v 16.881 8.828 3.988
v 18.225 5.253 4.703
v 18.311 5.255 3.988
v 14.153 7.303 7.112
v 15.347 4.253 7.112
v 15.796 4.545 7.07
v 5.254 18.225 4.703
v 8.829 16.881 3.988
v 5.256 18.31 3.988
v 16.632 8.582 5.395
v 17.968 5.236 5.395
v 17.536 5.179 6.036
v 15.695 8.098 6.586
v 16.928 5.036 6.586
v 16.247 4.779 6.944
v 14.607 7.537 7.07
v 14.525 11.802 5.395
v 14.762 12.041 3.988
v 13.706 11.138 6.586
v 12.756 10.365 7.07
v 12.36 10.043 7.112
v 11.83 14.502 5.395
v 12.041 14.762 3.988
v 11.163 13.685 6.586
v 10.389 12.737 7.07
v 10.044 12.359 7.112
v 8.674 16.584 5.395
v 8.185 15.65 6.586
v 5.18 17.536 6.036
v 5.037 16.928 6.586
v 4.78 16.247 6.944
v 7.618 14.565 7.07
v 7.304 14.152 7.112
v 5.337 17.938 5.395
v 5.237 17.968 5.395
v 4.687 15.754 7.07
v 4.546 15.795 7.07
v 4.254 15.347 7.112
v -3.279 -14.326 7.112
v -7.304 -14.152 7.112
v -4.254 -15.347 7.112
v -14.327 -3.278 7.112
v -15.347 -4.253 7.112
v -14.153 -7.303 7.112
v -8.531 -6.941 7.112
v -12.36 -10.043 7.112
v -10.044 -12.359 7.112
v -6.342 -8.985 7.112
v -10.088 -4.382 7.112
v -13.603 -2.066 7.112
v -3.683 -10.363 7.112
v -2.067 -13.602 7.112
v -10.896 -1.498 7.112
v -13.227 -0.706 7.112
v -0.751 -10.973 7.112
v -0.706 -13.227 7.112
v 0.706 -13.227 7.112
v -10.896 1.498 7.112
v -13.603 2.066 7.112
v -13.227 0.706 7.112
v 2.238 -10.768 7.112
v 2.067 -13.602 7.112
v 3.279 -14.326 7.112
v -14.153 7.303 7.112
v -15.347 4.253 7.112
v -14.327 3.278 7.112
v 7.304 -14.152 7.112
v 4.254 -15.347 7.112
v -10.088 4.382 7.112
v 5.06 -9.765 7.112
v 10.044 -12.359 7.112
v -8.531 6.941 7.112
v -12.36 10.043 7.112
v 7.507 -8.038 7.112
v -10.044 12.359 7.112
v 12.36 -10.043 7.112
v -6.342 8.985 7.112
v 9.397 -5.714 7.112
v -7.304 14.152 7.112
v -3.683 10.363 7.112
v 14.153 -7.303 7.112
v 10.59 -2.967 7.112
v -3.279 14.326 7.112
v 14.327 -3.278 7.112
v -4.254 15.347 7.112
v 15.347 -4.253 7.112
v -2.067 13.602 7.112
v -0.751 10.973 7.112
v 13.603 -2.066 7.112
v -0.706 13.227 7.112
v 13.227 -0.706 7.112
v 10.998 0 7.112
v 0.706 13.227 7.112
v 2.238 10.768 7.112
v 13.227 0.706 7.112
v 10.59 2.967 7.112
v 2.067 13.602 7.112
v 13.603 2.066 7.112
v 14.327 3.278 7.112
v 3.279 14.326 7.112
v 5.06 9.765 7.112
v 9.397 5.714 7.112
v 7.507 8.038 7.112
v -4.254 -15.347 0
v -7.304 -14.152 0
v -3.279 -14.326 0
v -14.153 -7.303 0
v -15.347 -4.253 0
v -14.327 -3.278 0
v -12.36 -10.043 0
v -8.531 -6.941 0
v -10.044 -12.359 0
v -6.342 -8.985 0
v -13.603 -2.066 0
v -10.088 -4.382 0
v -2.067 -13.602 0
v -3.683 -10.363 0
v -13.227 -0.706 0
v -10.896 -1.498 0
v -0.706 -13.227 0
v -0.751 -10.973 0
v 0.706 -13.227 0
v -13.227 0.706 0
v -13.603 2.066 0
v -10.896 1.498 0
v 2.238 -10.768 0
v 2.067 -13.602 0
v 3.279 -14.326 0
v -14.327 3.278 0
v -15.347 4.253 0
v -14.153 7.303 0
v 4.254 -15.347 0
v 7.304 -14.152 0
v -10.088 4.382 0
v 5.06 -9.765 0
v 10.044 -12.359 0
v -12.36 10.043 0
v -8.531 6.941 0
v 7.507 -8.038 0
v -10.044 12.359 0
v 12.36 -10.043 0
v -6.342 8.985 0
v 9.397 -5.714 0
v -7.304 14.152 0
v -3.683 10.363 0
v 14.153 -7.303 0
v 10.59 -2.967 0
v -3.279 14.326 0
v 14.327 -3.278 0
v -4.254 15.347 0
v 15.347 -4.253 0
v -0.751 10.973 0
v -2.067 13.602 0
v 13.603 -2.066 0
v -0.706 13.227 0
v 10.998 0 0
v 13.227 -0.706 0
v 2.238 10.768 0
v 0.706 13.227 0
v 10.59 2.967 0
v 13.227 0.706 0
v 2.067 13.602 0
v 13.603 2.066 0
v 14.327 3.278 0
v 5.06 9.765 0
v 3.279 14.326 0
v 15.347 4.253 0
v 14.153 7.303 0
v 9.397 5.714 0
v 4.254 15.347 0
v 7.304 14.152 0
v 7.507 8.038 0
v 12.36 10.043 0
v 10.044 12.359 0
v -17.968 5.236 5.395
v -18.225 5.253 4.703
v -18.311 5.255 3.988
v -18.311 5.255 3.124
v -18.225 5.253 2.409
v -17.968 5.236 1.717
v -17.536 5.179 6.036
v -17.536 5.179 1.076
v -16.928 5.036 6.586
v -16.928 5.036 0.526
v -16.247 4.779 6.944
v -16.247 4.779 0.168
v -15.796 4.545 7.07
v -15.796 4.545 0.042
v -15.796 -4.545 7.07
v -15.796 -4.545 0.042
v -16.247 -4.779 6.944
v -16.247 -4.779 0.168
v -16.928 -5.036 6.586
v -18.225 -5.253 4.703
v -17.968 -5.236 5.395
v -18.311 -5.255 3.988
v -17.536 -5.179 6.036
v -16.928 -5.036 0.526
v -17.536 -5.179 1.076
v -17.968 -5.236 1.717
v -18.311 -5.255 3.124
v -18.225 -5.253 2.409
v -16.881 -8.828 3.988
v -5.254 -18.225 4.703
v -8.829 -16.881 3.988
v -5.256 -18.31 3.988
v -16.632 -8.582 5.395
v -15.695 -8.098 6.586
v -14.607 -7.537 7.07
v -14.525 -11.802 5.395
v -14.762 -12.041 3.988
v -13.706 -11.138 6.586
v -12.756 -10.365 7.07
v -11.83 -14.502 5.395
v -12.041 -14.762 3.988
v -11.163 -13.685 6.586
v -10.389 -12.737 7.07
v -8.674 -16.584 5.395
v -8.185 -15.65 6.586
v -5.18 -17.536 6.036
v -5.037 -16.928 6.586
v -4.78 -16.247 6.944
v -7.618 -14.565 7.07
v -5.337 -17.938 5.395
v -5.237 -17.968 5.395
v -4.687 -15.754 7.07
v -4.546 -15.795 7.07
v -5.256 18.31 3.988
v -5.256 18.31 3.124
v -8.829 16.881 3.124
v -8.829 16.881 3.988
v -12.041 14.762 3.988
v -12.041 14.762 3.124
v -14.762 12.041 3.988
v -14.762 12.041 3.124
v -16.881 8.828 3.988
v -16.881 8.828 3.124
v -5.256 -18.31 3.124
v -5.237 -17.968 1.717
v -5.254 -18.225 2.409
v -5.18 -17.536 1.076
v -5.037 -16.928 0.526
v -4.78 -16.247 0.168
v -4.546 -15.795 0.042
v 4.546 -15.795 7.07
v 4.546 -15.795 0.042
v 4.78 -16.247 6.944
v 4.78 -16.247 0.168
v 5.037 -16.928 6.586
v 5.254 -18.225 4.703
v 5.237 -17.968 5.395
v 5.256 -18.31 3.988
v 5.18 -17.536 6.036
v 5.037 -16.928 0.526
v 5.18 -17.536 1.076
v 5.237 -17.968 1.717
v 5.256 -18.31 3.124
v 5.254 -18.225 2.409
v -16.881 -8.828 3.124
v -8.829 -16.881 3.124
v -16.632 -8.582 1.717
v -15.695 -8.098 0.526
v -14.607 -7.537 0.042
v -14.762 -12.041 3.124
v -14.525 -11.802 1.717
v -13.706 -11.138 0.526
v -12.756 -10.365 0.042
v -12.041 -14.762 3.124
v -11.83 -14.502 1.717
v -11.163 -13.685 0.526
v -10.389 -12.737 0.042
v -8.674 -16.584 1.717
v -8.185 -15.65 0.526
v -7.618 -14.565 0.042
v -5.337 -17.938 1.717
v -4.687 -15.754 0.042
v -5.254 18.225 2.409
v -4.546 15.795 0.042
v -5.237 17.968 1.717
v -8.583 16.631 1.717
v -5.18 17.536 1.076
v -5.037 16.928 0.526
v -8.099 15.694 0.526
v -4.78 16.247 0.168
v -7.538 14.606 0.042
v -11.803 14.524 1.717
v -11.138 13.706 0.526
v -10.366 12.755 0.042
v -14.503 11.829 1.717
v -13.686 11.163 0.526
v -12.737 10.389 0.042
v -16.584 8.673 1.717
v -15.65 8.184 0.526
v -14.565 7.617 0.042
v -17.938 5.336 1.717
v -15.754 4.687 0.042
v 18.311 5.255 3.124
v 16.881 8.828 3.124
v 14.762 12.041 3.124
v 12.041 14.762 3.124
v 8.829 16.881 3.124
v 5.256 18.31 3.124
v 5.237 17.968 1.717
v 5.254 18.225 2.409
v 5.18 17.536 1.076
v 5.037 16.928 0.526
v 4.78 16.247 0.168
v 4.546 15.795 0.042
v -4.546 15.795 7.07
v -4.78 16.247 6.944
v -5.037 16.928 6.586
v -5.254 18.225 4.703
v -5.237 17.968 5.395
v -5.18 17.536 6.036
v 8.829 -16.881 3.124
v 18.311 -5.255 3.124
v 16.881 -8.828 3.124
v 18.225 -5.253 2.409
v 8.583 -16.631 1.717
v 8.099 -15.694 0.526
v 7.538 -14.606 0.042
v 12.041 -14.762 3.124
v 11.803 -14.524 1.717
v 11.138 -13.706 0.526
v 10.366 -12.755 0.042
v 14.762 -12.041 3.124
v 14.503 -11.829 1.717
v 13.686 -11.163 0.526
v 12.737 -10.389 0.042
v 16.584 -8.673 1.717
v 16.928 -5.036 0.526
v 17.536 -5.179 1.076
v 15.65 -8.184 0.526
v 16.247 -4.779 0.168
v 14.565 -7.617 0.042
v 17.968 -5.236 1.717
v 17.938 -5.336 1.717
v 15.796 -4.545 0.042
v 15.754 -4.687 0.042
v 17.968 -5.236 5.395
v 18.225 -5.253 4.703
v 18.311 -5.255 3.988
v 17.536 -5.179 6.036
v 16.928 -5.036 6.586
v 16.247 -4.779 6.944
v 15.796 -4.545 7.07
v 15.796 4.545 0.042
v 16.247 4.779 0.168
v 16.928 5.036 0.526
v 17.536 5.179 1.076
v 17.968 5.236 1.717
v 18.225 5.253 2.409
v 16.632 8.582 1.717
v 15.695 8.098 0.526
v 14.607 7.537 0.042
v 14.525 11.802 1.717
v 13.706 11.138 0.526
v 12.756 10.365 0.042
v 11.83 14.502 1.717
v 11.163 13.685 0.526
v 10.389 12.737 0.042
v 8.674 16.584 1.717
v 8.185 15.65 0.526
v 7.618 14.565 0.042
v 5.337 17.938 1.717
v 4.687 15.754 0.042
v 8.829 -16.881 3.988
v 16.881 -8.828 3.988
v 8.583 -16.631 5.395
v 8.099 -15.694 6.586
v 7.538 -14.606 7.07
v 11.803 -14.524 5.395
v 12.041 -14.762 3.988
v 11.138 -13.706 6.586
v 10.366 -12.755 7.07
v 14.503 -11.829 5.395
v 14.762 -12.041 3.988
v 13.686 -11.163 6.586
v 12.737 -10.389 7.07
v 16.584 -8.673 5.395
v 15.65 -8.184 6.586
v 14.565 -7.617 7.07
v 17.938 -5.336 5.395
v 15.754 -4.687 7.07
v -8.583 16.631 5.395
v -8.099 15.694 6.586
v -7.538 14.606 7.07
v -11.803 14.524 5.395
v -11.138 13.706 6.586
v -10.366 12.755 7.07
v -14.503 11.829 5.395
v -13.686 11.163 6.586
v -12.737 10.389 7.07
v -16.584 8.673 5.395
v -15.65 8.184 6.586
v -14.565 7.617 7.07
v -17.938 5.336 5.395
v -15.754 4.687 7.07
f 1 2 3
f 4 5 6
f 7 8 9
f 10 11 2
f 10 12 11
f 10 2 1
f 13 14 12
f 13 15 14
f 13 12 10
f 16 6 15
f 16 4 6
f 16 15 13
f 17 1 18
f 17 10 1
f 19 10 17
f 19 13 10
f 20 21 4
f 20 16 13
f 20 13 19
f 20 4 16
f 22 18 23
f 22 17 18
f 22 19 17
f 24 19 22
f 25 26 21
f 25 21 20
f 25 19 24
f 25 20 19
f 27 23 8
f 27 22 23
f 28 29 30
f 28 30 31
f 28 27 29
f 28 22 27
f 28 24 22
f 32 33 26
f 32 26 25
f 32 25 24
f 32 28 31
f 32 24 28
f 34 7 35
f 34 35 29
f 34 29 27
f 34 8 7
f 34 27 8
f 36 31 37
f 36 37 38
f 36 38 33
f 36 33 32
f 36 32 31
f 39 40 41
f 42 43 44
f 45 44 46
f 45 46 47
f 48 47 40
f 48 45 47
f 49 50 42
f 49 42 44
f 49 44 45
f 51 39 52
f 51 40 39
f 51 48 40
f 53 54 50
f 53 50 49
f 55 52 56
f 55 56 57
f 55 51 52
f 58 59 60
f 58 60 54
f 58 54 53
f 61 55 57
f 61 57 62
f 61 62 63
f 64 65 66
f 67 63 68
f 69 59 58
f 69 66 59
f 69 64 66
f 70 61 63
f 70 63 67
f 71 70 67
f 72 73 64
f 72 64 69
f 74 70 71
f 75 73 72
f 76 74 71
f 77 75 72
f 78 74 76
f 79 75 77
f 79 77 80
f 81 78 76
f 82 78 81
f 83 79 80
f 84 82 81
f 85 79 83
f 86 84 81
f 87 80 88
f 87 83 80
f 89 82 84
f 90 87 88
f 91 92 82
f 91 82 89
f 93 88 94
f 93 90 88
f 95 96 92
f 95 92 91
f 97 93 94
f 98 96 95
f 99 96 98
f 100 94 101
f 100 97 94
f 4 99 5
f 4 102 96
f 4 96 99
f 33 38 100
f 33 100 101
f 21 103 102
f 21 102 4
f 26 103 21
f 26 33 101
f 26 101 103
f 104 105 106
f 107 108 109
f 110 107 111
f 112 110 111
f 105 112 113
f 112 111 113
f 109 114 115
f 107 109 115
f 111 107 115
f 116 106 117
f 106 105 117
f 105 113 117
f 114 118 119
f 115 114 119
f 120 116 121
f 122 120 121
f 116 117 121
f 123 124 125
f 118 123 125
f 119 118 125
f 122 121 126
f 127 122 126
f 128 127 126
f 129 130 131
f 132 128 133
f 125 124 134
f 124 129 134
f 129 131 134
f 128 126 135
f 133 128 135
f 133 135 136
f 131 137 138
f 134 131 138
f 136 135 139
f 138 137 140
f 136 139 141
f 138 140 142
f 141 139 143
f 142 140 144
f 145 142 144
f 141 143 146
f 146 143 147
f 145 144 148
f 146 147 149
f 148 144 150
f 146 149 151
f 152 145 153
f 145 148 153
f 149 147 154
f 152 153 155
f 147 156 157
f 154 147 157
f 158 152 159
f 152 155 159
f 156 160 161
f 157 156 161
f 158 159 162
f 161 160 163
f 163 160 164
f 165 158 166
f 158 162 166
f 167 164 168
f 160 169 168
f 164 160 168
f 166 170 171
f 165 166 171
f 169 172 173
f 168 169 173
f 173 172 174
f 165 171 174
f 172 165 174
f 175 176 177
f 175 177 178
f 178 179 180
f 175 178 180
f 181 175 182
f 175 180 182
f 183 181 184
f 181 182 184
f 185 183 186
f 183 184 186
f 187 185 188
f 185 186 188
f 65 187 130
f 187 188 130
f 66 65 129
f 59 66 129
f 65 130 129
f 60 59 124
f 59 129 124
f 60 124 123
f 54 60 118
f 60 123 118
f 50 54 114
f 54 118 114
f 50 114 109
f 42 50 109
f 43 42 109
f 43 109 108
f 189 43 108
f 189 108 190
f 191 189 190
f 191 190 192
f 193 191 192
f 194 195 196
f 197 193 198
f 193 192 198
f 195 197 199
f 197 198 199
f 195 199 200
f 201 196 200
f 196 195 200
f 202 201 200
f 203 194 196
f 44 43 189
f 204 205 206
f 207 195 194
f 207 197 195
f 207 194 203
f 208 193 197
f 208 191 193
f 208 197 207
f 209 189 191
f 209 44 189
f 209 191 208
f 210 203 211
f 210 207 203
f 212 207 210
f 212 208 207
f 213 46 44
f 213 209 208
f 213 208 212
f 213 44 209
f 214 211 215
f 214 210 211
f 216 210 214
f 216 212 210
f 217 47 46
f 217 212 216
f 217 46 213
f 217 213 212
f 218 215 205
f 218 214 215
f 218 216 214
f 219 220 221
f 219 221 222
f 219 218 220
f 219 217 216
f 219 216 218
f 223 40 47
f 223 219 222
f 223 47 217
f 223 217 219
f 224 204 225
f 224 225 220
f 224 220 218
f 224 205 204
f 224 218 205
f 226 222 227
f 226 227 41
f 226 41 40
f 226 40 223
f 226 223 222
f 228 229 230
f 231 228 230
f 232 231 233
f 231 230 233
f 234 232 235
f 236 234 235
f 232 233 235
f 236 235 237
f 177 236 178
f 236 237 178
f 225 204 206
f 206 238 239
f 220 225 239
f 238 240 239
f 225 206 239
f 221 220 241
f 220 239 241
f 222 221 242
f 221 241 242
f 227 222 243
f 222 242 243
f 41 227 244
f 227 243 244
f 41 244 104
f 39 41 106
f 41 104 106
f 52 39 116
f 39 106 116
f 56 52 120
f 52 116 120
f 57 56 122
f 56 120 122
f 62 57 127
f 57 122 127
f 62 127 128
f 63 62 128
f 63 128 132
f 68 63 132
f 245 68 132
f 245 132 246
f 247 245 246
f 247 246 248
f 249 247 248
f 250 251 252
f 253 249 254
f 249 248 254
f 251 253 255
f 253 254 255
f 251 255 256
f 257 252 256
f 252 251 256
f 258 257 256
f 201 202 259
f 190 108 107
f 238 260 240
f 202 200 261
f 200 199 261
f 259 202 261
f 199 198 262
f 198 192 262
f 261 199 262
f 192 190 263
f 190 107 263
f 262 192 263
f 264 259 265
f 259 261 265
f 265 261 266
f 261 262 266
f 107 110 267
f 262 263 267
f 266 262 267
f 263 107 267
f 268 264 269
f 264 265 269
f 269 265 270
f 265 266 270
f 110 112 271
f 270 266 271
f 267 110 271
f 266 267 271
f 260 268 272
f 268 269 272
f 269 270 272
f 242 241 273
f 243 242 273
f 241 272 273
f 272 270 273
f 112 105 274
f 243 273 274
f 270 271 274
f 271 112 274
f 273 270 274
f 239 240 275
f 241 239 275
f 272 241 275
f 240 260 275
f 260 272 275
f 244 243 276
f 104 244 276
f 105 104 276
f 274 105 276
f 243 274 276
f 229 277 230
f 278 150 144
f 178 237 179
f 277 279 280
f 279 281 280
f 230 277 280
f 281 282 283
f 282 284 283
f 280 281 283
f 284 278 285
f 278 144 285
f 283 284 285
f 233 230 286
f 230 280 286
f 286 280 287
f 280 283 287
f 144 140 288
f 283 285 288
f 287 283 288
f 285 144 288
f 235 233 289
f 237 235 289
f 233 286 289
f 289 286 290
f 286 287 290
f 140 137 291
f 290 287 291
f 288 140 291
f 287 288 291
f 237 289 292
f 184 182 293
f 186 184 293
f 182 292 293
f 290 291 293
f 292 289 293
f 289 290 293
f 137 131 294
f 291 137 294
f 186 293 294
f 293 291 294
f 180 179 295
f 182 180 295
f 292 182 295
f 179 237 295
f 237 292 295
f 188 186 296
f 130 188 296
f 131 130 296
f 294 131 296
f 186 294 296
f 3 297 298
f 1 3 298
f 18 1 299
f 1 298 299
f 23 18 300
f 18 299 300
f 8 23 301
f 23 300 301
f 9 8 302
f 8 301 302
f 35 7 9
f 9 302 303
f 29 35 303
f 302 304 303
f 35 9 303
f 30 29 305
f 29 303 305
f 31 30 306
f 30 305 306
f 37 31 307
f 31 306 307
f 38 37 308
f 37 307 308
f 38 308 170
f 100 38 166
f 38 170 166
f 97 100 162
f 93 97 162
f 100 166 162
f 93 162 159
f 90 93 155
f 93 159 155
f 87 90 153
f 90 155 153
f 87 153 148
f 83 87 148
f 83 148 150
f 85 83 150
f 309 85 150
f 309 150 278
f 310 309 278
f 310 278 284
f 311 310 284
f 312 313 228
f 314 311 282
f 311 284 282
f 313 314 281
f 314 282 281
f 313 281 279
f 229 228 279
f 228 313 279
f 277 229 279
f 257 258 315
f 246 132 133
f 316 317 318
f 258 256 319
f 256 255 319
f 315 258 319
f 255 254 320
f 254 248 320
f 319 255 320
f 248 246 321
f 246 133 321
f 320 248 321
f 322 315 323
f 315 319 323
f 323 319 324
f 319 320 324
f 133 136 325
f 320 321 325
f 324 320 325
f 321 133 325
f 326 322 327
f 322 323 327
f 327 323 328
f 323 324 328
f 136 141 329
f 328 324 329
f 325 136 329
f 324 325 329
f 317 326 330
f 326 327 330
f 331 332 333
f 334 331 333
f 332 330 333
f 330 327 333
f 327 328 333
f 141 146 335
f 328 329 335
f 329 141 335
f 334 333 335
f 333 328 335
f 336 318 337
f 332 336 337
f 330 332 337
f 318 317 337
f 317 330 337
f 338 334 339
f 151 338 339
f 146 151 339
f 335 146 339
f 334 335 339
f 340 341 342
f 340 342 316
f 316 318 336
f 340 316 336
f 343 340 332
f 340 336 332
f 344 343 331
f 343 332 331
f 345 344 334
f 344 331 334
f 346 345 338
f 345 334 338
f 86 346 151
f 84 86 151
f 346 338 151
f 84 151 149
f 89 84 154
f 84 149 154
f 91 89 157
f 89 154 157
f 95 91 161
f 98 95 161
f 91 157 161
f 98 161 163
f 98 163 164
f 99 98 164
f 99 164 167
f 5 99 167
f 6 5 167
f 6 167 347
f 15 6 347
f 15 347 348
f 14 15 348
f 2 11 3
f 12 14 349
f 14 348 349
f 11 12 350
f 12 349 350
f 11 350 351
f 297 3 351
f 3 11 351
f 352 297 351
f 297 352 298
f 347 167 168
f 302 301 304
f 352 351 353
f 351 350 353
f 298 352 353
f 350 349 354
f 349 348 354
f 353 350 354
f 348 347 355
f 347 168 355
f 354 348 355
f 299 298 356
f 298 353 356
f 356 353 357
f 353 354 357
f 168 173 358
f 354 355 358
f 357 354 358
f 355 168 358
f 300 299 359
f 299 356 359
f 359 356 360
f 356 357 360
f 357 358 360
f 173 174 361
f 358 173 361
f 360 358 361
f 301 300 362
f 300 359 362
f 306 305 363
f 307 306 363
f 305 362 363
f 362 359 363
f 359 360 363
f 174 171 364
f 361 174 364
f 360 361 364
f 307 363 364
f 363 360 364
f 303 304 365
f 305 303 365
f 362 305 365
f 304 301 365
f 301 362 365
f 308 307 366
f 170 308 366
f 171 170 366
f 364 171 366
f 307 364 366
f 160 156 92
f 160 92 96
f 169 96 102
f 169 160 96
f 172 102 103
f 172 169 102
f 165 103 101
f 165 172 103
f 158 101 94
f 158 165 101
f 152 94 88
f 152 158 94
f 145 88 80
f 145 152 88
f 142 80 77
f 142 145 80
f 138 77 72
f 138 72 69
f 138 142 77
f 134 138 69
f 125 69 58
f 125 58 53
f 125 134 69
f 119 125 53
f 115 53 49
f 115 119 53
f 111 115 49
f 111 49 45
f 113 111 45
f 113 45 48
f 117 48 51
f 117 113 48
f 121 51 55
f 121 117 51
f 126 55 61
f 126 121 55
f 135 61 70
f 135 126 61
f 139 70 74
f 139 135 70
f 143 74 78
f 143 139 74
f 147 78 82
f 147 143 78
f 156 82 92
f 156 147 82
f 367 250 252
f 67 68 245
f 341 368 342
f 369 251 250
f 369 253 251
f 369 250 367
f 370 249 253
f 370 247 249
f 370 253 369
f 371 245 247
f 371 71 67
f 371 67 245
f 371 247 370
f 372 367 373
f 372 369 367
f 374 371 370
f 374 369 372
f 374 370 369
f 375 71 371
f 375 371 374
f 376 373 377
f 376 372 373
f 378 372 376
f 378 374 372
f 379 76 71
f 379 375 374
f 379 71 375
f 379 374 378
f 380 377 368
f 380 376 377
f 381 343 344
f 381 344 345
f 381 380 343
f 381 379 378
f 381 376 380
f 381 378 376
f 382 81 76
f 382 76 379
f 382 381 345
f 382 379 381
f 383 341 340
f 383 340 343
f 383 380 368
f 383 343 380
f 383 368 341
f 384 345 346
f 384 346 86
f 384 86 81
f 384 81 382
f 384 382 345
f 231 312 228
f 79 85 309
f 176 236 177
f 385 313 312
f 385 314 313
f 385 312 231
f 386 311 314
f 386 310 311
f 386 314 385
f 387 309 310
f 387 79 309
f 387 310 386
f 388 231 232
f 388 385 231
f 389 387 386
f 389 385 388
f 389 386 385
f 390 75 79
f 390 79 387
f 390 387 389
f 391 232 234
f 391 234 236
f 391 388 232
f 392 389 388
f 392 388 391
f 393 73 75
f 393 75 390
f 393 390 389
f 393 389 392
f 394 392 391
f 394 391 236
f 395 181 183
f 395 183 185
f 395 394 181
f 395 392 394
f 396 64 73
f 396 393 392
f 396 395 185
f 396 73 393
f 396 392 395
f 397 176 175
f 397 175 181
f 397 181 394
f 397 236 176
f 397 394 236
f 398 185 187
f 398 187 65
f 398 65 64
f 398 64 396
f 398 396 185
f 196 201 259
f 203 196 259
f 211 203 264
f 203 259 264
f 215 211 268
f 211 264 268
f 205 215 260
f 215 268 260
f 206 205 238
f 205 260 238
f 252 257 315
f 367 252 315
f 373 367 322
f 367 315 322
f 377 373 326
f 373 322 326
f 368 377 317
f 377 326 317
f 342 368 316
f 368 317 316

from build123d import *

# Parameters (mm, degrees)
F0_R     = 10.9982
F1_DEPTH = 7.112
F2_R     = 3.1242


with BuildPart() as f1:
    # F0 (on Top) → F1 (new body)
    with BuildSketch(Plane.XY):
        with BuildLine():
            ThreePointArc((5.256284, 18.310488), (0, 13.178931), (-5.256284, 18.310488))
            ThreePointArc((-5.256284, 18.310488), (-13.470691, 13.470078), (-18.310727, 5.255451))
            ThreePointArc((-18.310727, 5.255451), (-13.17977, 0), (-18.310727, -5.255451))
            ThreePointArc((-18.310727, -5.255451), (-13.470691, -13.470078), (-5.256284, -18.310488))
            ThreePointArc((-5.256284, -18.310488), (0, -13.178933), (5.256284, -18.310488))
            ThreePointArc((5.256284, -18.310488), (13.47069, -13.470078), (18.310727, -5.255452))
            ThreePointArc((18.310727, -5.255452), (13.179773, 0), (18.310727, 5.255452))
            ThreePointArc((18.310727, 5.255452), (13.47069, 13.470078), (5.256284, 18.310488))
        make_face()
        Circle(F0_R, mode=Mode.SUBTRACT)
    extrude(amount=F1_DEPTH)

    # F2
    f2_edges = [f1.edges().sort_by_distance(p)[0] for p in [
        (-13.470691, 13.470078, 7.112),
        (-13.470691, -13.470078, 7.112),
        (13.47069, -13.470078, 7.112),
        (13.47069, 13.470078, 7.112),
        (13.47069, 13.470078, 0),
        (-13.470691, 13.470078, 0),
        (-13.470691, -13.470078, 0),
        (13.47069, -13.470078, 0),
    ]]
    fillet(f2_edges, radius=F2_R)


solid = f1.part
